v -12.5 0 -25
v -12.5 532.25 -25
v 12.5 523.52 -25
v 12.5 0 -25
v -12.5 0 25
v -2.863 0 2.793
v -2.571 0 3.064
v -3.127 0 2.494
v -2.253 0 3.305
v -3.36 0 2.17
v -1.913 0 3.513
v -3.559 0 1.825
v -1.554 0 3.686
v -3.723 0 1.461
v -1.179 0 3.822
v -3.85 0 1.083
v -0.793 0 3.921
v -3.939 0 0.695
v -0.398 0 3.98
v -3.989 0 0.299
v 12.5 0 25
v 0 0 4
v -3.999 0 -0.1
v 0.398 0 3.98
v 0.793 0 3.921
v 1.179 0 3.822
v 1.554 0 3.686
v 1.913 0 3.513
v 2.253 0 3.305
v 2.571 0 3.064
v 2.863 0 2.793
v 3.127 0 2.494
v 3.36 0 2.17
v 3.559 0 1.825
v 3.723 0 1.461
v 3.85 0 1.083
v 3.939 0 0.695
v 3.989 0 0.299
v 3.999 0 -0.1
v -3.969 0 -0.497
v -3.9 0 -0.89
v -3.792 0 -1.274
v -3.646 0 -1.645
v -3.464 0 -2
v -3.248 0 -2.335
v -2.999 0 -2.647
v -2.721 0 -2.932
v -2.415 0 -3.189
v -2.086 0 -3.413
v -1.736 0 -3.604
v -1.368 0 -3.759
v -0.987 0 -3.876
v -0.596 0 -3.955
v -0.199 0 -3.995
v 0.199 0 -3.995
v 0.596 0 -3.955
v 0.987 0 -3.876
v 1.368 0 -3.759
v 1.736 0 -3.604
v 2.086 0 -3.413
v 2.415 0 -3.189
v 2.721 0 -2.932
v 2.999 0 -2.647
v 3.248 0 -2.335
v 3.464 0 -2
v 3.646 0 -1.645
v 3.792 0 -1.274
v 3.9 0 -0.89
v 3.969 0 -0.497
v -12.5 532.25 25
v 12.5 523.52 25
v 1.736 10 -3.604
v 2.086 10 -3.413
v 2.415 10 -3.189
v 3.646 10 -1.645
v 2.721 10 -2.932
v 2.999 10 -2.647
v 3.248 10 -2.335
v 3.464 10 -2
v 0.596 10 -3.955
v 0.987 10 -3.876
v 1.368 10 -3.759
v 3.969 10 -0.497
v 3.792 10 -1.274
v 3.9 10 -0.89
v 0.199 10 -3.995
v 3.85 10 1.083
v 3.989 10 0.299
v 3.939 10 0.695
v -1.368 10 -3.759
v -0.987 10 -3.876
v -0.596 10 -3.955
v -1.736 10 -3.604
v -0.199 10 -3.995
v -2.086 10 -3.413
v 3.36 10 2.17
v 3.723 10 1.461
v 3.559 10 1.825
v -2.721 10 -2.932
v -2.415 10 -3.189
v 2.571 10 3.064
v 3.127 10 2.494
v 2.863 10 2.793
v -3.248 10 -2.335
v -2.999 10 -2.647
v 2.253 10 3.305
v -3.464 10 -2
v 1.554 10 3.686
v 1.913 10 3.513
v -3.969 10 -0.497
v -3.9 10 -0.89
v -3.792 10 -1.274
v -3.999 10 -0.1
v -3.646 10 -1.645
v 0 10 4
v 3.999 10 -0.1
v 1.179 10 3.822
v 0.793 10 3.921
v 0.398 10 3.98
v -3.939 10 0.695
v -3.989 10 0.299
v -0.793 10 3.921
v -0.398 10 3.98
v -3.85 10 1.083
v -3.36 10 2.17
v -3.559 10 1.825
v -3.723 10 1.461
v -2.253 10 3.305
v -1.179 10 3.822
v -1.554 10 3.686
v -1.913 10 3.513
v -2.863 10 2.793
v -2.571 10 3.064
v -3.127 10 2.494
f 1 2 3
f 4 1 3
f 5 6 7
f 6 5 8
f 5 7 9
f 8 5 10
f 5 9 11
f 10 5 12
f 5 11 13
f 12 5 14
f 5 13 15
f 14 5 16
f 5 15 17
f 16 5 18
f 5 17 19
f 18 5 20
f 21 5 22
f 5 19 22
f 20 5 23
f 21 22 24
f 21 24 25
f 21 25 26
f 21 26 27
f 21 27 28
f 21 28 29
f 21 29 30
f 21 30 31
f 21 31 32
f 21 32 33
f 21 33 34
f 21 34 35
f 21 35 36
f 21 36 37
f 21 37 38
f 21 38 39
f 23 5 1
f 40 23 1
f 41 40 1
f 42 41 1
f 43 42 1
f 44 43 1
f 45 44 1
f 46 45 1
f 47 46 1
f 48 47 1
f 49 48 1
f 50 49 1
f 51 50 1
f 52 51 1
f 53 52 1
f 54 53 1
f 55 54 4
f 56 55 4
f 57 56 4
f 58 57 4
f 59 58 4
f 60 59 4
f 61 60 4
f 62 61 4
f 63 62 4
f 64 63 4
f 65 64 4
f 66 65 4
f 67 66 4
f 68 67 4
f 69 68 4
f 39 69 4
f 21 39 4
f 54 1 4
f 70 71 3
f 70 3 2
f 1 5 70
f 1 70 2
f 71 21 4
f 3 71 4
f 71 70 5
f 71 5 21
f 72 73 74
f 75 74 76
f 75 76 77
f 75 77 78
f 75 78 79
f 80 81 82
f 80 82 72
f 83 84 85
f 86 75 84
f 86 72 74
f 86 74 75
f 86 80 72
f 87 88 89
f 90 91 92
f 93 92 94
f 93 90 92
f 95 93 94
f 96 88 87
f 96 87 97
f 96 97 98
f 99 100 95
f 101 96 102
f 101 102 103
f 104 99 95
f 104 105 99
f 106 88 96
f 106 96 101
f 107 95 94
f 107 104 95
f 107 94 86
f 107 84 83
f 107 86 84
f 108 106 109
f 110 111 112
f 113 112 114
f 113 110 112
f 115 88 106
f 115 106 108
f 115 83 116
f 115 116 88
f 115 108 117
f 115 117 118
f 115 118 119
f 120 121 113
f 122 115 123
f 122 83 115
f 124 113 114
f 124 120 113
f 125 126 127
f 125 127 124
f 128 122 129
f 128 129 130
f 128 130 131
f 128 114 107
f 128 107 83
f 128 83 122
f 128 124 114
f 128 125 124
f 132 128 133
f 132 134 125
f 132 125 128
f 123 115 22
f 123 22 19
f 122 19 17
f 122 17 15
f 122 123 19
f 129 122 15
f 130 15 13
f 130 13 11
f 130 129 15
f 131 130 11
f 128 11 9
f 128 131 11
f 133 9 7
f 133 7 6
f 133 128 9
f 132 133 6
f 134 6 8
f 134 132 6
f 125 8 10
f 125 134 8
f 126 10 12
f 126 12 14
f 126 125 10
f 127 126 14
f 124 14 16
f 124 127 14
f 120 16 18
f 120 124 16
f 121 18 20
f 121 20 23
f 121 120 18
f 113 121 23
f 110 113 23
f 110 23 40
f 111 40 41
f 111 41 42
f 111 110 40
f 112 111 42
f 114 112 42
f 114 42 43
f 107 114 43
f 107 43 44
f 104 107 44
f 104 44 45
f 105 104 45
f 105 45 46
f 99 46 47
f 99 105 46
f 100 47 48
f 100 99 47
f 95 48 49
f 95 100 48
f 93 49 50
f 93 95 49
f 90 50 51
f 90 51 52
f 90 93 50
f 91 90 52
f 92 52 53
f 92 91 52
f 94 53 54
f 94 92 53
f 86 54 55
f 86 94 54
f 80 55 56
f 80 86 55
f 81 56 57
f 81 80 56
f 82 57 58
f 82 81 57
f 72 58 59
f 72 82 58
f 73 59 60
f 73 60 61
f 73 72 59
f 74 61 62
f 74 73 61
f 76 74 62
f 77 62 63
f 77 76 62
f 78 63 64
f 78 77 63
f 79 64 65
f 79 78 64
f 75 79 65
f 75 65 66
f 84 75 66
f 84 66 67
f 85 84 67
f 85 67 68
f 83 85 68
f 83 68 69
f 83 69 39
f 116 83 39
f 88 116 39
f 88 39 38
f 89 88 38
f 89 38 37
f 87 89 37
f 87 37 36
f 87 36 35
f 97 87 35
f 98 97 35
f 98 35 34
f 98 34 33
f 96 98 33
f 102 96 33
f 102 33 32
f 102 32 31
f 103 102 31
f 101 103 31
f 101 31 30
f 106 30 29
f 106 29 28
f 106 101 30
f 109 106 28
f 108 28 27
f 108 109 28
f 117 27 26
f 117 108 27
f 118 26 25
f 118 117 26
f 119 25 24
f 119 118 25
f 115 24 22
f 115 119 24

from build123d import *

# Parameters (mm, degrees)
SKETCH_1_W          = 25
SKETCH_1_H          = 50
EXTRUDE_1_DEPTH     = 550
SKETCH_2_R          = 4
CUT_EXTRUDE_1_DEPTH = 10
CUT_EXTRUDE_START   = -10
SKETCH_3_R          = 4
CUT_EXTRUDE_2_DEPTH = 10
CUT_EXTRUDE_4_DEPTH = 550


with BuildPart() as part:
    # Эскиз1 → Бобышка-Вытянуть1 (new body)
    with BuildSketch(Plane(origin=(0, 0, 0), x_dir=(1, 0, 0), z_dir=(0, 1, 0))):
        Rectangle(SKETCH_1_W, SKETCH_1_H)
    extrude(amount=EXTRUDE_1_DEPTH)

    # Эскиз2 → Вырез-Вытянуть1 (cut)
    with BuildSketch(Plane(origin=(0, 550, 0), x_dir=(1, 0, 0), z_dir=(0, 1, 0))):
        with Locations(Location((0, 0, 0), (0, 0, 270))):
            Circle(SKETCH_2_R)
    extrude(amount=-CUT_EXTRUDE_1_DEPTH, mode=Mode.SUBTRACT)

    # Эскиз3 → Вырез-Вытянуть2 (cut)
    with BuildSketch(Plane.XZ.offset(CUT_EXTRUDE_START)):
        with Locations(Location((0, 0, 0), (0, 0, 90))):
            Circle(SKETCH_3_R)
    extrude(amount=CUT_EXTRUDE_2_DEPTH, mode=Mode.SUBTRACT)

    # Эскиз4 → Вырез-Вытянуть4 (cut)
    with BuildSketch(Plane.XY.offset(25)):
        Polygon((12.5, 550), (12.5, 523.51952282), (-12.5, 532.24968156), (-12.5, 550), align=None)
    extrude(amount=-CUT_EXTRUDE_4_DEPTH, mode=Mode.SUBTRACT)


solid = part.part
